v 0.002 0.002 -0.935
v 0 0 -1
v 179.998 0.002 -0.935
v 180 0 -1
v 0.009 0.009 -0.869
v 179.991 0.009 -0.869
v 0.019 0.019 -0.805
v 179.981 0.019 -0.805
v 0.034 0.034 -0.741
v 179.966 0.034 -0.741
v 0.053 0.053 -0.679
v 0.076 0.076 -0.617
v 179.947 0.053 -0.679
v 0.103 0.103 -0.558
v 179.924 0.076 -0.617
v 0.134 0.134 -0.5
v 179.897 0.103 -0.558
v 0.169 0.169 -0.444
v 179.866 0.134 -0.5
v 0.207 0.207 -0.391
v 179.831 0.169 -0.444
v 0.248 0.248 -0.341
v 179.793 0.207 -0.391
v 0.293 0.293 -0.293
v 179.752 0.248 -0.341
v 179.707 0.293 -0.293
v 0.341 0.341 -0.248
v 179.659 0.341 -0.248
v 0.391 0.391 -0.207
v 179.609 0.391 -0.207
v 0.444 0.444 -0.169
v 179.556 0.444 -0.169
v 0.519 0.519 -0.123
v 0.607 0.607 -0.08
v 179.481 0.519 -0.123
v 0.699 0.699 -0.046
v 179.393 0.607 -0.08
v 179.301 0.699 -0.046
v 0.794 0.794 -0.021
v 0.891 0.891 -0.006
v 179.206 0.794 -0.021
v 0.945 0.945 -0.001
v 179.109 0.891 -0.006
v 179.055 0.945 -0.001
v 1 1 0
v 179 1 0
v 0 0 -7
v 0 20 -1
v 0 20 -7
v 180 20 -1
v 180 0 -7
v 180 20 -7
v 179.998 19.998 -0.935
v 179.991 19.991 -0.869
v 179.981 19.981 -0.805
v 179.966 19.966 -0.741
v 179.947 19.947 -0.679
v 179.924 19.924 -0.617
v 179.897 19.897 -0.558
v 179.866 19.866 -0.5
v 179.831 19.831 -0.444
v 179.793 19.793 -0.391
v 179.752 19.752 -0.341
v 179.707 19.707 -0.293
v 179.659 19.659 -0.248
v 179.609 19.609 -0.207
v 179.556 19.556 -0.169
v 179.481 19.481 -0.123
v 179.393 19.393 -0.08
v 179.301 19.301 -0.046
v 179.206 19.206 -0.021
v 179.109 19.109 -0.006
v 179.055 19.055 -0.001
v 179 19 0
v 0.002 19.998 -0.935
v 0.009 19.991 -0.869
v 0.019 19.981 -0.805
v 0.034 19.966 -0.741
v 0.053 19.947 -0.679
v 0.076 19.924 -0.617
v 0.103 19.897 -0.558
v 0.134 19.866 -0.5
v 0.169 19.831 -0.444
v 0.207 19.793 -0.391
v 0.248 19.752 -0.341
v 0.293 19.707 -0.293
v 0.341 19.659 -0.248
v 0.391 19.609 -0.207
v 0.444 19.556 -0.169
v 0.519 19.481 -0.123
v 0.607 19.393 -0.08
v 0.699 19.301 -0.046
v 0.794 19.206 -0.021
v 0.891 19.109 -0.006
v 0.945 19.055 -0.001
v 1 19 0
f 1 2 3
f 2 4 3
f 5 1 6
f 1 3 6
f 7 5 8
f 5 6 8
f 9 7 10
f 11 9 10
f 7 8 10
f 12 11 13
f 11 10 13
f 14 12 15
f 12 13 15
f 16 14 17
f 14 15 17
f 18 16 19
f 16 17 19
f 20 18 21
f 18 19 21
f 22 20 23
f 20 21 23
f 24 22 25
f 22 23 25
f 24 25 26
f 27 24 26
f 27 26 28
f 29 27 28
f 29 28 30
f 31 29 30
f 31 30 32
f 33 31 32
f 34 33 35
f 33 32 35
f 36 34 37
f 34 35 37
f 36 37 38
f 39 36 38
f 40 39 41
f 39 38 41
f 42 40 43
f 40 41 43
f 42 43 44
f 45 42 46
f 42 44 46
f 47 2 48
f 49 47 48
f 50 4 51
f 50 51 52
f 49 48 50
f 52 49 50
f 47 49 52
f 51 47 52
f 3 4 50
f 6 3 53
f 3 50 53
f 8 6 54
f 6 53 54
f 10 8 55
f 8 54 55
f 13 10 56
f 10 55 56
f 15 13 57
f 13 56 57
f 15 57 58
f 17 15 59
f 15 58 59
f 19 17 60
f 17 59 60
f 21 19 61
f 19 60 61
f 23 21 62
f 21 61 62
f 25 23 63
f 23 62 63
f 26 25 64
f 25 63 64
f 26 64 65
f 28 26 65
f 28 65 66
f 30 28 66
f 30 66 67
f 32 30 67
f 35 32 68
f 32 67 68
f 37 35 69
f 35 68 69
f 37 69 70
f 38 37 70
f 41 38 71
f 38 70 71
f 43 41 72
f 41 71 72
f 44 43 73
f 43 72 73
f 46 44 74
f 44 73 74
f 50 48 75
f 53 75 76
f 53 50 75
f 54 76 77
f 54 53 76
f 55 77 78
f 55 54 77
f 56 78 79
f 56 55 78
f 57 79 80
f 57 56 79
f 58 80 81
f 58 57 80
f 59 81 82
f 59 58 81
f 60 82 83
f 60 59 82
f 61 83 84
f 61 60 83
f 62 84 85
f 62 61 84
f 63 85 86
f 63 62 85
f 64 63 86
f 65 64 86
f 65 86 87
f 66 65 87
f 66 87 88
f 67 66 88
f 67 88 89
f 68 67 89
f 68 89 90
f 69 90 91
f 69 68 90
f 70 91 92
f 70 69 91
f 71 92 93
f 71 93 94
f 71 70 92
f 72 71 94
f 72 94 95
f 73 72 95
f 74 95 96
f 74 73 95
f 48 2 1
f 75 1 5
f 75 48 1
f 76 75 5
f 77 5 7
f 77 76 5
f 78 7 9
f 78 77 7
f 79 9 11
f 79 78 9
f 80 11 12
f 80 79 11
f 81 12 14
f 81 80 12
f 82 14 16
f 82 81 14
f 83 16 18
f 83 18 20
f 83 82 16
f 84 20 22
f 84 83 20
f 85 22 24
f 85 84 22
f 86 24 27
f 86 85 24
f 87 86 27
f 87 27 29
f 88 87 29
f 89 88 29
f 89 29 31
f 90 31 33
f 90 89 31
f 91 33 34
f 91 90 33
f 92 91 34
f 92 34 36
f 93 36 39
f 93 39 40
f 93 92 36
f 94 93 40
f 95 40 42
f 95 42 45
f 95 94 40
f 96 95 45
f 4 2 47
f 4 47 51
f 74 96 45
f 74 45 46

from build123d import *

# Parameters (mm, degrees)
F0_W     = 180
F0_H     = 20
F1_DEPTH = 7
F2_R     = 1


with BuildPart() as f1:
    # F0 (on Top) → F1 (new body)
    with BuildSketch(Plane.XY):
        with Locations((90, 10)):
            Rectangle(F0_W, F0_H)
    extrude(amount=-F1_DEPTH)

    # F2
    f2_edges = [f1.edges().sort_by_distance(p)[0] for p in [
        (90, 20, 0),
        (0, 10, 0),
        (90, 0, 0),
        (180, 10, 0),
    ]]
    fillet(f2_edges, radius=F2_R)


solid = f1.part
